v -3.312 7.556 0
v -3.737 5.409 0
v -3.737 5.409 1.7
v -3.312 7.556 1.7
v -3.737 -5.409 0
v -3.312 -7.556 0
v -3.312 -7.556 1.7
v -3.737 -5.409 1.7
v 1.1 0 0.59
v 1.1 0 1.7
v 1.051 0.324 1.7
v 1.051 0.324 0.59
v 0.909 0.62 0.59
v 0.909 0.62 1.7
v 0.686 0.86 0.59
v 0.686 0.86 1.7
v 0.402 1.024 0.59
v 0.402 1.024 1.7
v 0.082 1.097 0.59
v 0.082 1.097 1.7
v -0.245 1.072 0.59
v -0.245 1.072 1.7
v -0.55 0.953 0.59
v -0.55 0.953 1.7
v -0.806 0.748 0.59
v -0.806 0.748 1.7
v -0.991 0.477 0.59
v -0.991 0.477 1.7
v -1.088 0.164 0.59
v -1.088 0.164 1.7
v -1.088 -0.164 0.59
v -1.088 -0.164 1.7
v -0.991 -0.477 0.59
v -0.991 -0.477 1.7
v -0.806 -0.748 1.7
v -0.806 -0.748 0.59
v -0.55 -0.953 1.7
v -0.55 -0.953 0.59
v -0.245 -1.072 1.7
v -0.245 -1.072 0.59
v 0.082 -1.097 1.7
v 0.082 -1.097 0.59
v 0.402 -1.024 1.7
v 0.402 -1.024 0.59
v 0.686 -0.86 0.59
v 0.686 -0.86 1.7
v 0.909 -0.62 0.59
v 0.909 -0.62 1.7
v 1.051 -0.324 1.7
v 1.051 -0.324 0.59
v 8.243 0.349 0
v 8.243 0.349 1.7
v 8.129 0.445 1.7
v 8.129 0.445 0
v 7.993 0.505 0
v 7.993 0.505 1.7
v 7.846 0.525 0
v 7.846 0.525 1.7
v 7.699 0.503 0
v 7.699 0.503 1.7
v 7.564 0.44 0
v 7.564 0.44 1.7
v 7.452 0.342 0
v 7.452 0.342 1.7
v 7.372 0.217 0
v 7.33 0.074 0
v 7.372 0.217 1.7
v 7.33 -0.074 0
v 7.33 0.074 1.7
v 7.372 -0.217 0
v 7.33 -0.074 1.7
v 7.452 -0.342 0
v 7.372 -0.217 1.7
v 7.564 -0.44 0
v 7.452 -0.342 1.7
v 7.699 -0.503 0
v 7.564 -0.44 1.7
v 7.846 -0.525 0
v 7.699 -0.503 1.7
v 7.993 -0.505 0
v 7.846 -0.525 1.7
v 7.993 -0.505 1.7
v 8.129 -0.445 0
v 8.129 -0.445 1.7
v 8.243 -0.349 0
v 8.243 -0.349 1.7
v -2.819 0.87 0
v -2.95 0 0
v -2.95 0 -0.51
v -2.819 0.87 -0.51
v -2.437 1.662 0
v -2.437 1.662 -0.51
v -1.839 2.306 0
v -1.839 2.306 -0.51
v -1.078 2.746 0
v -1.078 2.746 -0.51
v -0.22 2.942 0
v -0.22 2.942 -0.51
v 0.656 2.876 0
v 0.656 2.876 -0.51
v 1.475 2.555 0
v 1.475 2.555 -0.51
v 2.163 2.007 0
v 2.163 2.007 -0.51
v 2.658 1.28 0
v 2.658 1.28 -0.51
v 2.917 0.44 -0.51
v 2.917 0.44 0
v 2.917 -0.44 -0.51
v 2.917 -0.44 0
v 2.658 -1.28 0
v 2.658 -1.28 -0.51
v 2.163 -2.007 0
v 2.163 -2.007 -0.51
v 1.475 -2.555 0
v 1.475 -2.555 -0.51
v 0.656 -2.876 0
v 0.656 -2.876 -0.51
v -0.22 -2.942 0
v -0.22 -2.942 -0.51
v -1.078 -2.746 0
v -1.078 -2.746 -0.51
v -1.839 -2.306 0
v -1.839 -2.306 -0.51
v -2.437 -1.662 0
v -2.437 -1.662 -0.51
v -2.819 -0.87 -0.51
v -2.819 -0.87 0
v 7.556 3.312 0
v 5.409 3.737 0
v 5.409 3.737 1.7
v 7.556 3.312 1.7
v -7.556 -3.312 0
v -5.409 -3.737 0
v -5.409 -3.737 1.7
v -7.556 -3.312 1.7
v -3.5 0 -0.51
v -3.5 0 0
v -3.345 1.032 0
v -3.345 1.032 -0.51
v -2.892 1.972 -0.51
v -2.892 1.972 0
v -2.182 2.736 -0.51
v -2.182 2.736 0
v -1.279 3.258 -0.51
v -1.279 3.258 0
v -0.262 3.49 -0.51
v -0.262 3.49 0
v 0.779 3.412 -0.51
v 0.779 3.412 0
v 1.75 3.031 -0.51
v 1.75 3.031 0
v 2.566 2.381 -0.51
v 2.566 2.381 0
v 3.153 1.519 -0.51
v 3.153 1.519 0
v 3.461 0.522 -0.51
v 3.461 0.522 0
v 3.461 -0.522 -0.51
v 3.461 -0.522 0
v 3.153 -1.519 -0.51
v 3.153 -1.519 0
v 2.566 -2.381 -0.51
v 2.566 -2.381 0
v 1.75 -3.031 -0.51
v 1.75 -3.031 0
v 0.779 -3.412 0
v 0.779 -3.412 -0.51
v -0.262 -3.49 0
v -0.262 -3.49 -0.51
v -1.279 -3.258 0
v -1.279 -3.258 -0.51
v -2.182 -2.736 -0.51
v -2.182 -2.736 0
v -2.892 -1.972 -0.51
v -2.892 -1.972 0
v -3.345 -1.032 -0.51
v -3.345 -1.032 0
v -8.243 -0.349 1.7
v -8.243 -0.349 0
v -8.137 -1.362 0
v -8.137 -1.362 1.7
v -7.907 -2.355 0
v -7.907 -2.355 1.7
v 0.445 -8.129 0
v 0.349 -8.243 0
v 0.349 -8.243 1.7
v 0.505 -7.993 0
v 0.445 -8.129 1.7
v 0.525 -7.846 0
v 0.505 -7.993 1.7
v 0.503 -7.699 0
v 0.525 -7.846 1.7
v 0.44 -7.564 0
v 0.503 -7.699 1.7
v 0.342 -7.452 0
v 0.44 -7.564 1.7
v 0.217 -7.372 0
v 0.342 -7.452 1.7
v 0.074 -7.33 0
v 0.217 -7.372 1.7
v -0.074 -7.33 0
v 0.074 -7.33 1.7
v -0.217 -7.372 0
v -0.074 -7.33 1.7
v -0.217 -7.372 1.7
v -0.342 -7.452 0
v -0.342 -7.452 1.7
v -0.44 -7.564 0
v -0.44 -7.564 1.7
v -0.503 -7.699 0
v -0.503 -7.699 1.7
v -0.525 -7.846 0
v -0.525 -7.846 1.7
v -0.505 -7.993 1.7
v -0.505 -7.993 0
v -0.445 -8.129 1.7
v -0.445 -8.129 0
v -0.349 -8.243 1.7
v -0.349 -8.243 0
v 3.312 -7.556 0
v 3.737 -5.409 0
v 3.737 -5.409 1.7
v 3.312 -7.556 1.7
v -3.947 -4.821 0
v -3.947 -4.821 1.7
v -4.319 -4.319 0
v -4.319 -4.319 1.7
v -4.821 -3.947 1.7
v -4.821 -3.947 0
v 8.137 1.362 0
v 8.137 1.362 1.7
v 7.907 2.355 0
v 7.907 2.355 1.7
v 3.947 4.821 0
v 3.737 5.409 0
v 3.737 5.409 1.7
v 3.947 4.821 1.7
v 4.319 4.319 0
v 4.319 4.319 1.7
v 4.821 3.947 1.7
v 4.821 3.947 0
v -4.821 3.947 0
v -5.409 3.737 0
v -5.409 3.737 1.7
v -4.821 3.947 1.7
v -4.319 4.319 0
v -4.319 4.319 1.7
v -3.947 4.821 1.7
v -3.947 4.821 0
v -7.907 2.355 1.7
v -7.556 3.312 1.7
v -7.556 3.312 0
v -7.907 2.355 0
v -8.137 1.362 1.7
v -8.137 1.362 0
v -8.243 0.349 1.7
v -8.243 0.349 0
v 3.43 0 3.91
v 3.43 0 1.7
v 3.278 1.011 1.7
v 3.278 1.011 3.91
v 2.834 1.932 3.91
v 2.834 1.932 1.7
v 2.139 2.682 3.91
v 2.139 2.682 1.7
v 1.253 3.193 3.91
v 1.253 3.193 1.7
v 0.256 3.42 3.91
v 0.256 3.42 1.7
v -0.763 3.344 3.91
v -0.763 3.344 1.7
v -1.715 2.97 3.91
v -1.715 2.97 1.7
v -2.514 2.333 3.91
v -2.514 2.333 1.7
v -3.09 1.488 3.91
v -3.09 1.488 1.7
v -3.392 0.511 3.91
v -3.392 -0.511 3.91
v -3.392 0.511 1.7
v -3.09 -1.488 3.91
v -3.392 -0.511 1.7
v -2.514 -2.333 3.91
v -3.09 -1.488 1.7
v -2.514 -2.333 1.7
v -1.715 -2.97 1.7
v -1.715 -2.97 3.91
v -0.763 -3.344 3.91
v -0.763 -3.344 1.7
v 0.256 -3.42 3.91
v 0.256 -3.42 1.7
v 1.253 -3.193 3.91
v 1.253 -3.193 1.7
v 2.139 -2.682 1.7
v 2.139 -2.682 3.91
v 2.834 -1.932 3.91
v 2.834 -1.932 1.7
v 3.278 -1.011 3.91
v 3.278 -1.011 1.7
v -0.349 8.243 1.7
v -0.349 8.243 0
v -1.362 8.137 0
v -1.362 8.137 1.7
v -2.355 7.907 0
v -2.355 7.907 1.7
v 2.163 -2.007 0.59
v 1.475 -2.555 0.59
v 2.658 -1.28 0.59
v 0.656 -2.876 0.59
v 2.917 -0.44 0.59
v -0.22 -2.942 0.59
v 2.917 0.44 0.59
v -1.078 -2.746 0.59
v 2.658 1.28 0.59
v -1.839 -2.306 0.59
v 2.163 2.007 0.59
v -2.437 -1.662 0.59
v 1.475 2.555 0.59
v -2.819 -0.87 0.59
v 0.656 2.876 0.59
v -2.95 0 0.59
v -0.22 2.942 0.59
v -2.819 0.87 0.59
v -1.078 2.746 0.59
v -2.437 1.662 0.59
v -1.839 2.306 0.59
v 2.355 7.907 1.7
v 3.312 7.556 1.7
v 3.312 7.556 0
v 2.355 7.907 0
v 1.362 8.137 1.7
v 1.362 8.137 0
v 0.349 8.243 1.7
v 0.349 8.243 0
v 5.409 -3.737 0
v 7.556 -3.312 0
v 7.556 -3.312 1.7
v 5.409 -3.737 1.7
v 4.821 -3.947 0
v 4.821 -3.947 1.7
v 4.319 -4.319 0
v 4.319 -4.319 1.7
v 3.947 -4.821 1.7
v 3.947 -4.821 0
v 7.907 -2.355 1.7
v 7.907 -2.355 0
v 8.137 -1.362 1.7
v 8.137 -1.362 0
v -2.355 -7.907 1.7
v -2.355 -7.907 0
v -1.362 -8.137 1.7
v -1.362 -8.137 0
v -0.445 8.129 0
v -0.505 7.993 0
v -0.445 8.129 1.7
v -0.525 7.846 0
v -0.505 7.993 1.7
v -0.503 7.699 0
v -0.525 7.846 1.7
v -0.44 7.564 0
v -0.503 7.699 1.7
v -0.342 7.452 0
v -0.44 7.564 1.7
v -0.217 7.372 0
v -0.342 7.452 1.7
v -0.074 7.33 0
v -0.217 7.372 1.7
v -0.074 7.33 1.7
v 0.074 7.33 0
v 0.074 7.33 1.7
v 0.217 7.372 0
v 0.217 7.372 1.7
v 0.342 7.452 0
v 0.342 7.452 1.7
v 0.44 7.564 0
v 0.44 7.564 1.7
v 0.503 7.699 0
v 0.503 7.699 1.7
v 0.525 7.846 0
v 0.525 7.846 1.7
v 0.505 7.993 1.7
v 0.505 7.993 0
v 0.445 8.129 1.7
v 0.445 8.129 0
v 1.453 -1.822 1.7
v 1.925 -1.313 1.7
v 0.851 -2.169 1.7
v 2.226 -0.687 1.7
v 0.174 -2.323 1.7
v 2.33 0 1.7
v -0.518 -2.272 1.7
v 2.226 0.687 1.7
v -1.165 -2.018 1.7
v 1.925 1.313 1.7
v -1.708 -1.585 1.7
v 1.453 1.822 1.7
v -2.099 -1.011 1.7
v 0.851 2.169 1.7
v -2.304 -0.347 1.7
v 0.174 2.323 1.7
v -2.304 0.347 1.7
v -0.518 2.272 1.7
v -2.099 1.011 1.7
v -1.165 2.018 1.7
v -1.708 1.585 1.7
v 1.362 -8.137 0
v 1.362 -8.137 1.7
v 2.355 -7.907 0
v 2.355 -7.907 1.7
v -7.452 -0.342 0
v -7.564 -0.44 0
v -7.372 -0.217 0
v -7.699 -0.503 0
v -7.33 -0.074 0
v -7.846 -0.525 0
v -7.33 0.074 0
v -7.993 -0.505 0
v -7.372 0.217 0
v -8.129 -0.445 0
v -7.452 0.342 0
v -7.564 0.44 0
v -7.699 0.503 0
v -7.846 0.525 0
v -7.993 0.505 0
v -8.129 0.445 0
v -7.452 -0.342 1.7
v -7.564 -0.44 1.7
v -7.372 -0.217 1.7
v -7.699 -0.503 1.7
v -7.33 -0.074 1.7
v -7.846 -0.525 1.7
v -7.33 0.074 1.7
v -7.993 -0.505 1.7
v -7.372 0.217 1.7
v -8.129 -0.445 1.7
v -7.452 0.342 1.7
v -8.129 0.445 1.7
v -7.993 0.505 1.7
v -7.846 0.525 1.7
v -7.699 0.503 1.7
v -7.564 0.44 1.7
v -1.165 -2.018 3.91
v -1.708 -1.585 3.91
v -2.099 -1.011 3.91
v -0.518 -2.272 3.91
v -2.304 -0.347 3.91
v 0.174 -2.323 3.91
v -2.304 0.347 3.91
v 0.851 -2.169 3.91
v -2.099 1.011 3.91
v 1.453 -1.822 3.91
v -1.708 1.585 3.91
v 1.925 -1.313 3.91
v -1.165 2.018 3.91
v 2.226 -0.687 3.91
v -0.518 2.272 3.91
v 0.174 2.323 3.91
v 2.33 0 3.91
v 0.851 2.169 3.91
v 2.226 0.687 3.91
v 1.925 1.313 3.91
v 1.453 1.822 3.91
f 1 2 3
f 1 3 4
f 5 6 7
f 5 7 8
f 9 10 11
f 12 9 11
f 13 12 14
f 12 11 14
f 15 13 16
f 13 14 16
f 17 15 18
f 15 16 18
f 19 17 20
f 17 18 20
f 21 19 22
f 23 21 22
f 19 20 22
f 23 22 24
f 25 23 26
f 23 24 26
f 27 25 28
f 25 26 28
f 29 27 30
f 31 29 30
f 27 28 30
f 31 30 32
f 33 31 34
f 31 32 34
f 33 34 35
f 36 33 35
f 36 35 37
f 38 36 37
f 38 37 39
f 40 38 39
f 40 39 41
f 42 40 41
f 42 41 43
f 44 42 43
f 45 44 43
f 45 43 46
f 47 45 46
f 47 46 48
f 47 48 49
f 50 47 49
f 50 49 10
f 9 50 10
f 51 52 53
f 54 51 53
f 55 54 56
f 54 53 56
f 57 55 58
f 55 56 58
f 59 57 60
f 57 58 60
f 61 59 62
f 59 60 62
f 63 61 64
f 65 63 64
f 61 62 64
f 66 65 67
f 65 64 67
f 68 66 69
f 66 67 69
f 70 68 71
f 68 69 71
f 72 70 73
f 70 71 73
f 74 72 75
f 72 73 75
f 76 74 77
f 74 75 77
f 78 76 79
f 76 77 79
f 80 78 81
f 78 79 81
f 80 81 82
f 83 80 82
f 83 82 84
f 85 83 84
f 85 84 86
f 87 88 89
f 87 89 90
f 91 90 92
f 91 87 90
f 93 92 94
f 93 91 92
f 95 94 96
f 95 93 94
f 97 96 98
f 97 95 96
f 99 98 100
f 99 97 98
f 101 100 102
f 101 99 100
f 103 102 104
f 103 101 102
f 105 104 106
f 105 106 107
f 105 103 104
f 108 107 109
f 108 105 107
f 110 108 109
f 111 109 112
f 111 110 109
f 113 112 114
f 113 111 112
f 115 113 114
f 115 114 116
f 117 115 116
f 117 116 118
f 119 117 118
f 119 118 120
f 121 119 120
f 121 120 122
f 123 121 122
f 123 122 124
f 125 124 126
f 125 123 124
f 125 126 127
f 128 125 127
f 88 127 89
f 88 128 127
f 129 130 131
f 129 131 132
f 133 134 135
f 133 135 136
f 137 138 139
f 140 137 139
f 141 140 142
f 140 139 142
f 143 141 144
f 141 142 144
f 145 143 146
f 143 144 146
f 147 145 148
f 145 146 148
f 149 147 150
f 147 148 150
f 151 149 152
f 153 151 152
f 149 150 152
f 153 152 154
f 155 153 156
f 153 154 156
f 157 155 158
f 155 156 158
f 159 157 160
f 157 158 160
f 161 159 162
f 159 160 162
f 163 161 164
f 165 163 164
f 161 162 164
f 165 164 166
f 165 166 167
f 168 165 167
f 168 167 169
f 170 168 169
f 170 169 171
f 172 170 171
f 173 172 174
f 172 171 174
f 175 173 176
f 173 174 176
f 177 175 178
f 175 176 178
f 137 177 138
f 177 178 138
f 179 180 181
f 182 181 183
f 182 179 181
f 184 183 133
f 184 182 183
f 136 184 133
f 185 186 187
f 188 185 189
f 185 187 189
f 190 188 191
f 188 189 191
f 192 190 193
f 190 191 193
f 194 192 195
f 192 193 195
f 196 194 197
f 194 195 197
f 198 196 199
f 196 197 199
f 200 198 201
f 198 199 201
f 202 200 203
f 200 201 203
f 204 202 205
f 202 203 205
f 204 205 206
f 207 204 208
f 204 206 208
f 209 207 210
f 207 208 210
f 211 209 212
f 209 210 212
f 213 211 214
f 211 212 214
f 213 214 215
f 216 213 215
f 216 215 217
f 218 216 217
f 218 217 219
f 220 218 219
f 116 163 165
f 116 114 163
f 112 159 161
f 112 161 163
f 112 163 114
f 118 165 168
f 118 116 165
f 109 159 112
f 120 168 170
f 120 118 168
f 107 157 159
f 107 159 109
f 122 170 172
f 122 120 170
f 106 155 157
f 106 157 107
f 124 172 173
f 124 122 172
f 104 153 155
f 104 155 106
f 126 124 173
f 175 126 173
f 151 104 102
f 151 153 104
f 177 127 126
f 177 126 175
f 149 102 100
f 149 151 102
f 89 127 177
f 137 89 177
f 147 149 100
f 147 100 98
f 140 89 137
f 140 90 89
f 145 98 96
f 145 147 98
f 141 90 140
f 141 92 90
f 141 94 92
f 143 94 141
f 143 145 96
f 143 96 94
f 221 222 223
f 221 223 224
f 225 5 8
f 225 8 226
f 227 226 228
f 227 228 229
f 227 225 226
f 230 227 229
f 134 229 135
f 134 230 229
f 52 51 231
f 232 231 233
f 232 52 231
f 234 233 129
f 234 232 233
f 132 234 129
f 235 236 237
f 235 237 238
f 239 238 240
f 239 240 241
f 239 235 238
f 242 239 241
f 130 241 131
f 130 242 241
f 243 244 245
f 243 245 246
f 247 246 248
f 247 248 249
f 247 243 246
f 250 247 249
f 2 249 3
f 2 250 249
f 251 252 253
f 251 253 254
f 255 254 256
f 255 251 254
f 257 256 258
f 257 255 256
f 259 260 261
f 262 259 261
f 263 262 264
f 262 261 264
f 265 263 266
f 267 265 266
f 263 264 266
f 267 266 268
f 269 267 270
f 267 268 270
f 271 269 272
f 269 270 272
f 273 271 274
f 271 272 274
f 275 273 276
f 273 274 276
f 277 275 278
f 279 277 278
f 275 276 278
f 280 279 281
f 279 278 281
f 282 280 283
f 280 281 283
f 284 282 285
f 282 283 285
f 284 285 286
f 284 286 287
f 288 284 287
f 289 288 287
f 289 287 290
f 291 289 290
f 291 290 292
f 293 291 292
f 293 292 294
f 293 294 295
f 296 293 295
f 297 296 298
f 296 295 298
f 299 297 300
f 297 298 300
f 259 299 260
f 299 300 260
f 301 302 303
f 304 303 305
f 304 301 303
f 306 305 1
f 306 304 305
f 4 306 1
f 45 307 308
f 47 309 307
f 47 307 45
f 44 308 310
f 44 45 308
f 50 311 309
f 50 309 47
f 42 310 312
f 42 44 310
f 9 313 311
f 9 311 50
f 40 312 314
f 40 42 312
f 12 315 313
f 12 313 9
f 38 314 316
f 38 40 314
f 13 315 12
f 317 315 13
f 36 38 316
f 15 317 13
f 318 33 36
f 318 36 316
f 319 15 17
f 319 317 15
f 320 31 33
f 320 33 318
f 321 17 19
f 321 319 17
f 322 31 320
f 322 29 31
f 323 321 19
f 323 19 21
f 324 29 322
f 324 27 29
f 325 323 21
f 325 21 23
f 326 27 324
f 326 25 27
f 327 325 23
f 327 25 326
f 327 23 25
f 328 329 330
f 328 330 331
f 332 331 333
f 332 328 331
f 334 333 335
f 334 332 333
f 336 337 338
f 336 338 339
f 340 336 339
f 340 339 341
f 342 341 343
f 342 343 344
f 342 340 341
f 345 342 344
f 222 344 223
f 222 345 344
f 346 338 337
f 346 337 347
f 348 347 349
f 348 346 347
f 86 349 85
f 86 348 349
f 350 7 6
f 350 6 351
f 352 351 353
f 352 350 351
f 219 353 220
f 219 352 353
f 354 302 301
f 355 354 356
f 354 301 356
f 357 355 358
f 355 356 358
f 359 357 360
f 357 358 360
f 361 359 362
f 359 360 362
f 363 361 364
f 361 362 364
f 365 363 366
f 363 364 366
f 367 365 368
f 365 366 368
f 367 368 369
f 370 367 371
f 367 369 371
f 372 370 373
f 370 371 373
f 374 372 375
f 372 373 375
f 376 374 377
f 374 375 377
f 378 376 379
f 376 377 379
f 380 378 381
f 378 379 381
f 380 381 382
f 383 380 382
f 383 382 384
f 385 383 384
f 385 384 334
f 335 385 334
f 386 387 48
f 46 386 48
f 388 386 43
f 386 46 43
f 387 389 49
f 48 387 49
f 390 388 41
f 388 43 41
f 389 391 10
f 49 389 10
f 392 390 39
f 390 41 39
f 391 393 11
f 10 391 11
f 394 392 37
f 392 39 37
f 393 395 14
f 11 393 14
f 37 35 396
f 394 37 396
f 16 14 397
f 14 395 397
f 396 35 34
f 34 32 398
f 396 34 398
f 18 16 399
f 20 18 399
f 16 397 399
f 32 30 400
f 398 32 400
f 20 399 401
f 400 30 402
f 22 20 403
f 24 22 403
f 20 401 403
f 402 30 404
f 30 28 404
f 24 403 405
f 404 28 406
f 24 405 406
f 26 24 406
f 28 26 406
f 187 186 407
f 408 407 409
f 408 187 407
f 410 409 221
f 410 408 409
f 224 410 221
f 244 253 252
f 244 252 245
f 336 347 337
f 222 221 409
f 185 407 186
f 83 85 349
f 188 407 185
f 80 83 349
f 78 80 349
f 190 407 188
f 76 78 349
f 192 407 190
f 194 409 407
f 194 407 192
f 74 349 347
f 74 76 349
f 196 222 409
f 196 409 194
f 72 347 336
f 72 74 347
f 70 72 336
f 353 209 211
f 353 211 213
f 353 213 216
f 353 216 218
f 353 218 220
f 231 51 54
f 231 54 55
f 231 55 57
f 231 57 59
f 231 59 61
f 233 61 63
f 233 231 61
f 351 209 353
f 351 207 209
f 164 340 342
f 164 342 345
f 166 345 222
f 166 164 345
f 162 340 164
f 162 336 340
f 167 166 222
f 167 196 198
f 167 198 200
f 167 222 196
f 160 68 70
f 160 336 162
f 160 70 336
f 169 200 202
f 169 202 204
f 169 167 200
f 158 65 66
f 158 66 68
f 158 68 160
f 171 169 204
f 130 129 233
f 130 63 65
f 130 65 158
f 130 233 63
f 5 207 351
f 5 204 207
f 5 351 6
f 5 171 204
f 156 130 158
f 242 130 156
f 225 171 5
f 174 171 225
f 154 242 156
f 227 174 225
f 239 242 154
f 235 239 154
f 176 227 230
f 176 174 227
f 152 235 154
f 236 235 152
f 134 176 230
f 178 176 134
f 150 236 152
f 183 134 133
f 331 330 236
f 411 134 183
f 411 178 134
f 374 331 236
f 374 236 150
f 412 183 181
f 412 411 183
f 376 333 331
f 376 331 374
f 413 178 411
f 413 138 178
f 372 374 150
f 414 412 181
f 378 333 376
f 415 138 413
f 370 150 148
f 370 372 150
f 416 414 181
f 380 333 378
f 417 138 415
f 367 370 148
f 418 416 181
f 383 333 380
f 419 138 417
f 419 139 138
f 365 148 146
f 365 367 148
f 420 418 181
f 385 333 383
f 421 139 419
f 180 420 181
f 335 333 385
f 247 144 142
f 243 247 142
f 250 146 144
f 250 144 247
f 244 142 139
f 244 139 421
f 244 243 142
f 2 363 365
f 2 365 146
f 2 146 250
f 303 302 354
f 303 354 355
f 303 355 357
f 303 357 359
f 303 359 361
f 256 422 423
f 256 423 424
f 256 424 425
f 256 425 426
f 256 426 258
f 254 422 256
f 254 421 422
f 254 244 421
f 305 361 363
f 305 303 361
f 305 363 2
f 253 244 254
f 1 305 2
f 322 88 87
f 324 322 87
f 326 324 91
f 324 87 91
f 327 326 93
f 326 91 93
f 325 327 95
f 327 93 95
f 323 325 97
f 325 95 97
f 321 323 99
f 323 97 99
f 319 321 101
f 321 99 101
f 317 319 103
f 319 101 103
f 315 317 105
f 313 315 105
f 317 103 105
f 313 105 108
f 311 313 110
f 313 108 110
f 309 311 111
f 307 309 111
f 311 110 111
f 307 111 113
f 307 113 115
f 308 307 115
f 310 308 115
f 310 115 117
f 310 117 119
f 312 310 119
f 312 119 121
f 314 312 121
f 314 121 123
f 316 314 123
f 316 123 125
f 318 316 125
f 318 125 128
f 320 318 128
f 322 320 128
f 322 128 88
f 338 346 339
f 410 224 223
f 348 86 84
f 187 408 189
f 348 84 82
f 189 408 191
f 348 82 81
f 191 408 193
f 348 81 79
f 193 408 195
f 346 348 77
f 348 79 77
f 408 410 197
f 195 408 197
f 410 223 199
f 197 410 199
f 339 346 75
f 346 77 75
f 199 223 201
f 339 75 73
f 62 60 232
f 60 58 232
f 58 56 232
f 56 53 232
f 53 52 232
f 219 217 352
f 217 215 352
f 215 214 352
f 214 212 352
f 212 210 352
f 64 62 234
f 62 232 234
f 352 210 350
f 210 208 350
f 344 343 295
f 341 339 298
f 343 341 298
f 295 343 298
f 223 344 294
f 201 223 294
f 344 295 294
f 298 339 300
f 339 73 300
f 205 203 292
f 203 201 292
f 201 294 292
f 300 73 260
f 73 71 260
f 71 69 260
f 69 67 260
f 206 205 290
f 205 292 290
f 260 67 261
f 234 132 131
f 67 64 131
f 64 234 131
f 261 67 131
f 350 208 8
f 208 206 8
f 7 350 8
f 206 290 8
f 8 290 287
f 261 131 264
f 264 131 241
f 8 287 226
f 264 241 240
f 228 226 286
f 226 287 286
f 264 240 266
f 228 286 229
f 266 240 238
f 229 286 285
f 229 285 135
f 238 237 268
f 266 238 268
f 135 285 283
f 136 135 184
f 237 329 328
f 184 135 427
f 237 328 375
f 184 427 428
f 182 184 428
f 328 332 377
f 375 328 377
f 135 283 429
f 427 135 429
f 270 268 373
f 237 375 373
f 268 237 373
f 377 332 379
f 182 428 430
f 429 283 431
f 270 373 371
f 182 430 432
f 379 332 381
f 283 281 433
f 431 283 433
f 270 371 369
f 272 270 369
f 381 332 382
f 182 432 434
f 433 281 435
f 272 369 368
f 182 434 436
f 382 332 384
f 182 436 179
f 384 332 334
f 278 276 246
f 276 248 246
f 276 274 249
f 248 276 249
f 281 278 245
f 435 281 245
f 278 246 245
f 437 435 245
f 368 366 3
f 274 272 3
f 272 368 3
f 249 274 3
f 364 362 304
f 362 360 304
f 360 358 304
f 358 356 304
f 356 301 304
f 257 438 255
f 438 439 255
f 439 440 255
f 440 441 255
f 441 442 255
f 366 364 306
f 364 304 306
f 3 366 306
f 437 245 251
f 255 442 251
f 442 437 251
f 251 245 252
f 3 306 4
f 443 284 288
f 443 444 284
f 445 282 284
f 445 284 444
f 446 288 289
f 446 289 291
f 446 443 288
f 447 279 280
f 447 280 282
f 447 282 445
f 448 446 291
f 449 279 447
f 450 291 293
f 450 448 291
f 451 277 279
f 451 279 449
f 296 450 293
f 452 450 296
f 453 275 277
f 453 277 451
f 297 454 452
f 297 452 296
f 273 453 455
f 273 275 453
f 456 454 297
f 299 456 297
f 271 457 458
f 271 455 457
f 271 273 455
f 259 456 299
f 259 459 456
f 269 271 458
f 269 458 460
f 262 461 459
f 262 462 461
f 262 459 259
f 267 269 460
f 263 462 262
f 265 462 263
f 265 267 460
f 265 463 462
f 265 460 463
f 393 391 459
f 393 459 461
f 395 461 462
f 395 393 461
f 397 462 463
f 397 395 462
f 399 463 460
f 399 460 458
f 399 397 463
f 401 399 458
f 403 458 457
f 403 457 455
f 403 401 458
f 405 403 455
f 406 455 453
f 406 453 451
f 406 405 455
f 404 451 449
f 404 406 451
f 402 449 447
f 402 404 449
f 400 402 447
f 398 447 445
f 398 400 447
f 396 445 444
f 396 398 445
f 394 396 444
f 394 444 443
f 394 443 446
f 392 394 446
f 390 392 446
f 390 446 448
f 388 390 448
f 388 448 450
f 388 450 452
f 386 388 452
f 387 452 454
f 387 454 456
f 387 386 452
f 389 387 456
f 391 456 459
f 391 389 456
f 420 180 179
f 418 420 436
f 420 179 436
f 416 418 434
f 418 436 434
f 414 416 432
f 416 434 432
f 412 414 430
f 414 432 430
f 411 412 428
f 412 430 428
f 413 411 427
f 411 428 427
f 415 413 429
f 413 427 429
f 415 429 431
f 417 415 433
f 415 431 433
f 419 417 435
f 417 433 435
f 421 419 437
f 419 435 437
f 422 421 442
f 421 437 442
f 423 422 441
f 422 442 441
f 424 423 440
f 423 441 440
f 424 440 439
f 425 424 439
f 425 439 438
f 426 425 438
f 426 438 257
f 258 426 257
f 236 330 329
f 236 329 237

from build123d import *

# Parameters (mm, degrees)
BOSS_EXTRUDE1_DEPTH     = 1.7
CUT_EXTRUDE1_REACH      = 3.7
SKETCH2_R               = 1.1
SKETCH3_R               = 3.43
SKETCH3_R_2             = 2.33
BOSS_EXTRUDE2_DEPTH     = 2.21
SKETCH4_R               = 3.5
SKETCH4_R_2             = 2.95
BOSS_EXTRUDE3_DEPTH     = 0.51
SKETCH5_R               = 2.95
CUT_EXTRUDE2_DEPTH      = 1.1
CUT_EXTRUDE3_REACH      = 4.21
SKETCH6_R               = 0.525
SKETCH7_R               = 18.883041925
SKETCH7_R_2             = 8.25
CUT_EXTRUDE4_DEPTH      = 3.21
CUT_EXTRUDE4_DEPTH_BACK = 3.21


with BuildPart() as part:
    # Sketch1 → Boss-Extrude1 (new body)
    with BuildSketch(Plane.XY):
        with BuildLine():
            Line((5.409077957, 3.736708277), (13.762285951, 2.084772448))
            ThreePointArc((13.762285951, 2.084772448), (15.475148434, 0), (13.762285951, -2.084772448))
            Line((13.762285951, -2.084772448), (5.409077957, -3.736708277))
            ThreePointArc((5.409077957, -3.736708277), (4.318733201, -4.318733201), (3.736708277, -5.409077957))
            Line((3.736708277, -5.409077957), (2.084772448, -13.762285951))
            ThreePointArc((2.084772448, -13.762285951), (0, -15.475148434), (-2.084772448, -13.762285951))
            Line((-2.084772448, -13.762285951), (-3.736708277, -5.409077957))
            ThreePointArc((-3.736708277, -5.409077957), (-4.318733201, -4.318733201), (-5.409077957, -3.736708277))
            Line((-5.409077957, -3.736708277), (-13.762285951, -2.084772448))
            ThreePointArc((-13.762285951, -2.084772448), (-15.475148434, 0), (-13.762285951, 2.084772448))
            Line((-13.762285951, 2.084772448), (-5.409077957, 3.736708277))
            ThreePointArc((-5.409077957, 3.736708277), (-4.318733201, 4.318733201), (-3.736708277, 5.409077957))
            Line((-3.736708277, 5.409077957), (-2.084772448, 13.762285951))
            ThreePointArc((-2.084772448, 13.762285951), (0, 15.475148434), (2.084772448, 13.762285951))
            Line((2.084772448, 13.762285951), (3.736708277, 5.409077957))
            ThreePointArc((3.736708277, 5.409077957), (4.318733201, 4.318733201), (5.409077957, 3.736708277))
        make_face()
    extrude(amount=BOSS_EXTRUDE1_DEPTH)

    # Sketch2 → Cut-Extrude1 (cut, up to next)
    with BuildSketch(Plane.XY.offset(1.7), mode=Mode.PRIVATE) as cut_extrude1_sk1:
        Circle(SKETCH2_R)
    cut_extrude1_tool1 = extrude(cut_extrude1_sk1.sketch, amount=-CUT_EXTRUDE1_REACH, mode=Mode.PRIVATE) & part.part
    add(cut_extrude1_tool1.solids().sort_by_distance((0, 0, 1.7))[0], mode=Mode.SUBTRACT)

    # Sketch3 → Boss-Extrude2 (add)
    with BuildSketch(Plane.XY.offset(1.7)):
        Circle(SKETCH3_R)
        Circle(SKETCH3_R_2, mode=Mode.SUBTRACT)
    extrude(amount=BOSS_EXTRUDE2_DEPTH)

    # Sketch4 → Boss-Extrude3 (add)
    with BuildSketch(Plane(origin=(0, 0, 0), x_dir=(-1, 0, 0), z_dir=(0, 0, -1))):
        Circle(SKETCH4_R)
        Circle(SKETCH4_R_2, mode=Mode.SUBTRACT)
    extrude(amount=BOSS_EXTRUDE3_DEPTH)

    # Sketch5 → Cut-Extrude2 (cut)
    with BuildSketch(Plane(origin=(0, 0, -0.51), x_dir=(-1, 0, 0), z_dir=(0, 0, -1))):
        Circle(SKETCH5_R)
    extrude(amount=-CUT_EXTRUDE2_DEPTH, mode=Mode.SUBTRACT)

    # Sketch6 → Cut-Extrude3 (cut, up to next)
    with BuildSketch(Plane.XY.offset(1.7), mode=Mode.PRIVATE) as cut_extrude3_sk1:
        with Locations((0, 13.35)):
            Circle(SKETCH6_R)
    cut_extrude3_tool1 = extrude(cut_extrude3_sk1.sketch, amount=-CUT_EXTRUDE3_REACH, mode=Mode.PRIVATE) & part.part
    add(cut_extrude3_tool1.solids().sort_by_distance((0, 13.35, 1.7))[0], mode=Mode.SUBTRACT)
    # Sketch6 → Cut-Extrude3 (cut, up to next)
    with BuildSketch(Plane.XY.offset(1.7), mode=Mode.PRIVATE) as cut_extrude3_sk2:
        with Locations((0, 10.6)):
            Circle(SKETCH6_R)
    cut_extrude3_tool2 = extrude(cut_extrude3_sk2.sketch, amount=-CUT_EXTRUDE3_REACH, mode=Mode.PRIVATE) & part.part
    add(cut_extrude3_tool2.solids().sort_by_distance((0, 10.6, 1.7))[0], mode=Mode.SUBTRACT)
    # Sketch6 → Cut-Extrude3 (cut, up to next)
    with BuildSketch(Plane.XY.offset(1.7), mode=Mode.PRIVATE) as cut_extrude3_sk3:
        with Locations((0, 7.85)):
            Circle(SKETCH6_R)
    cut_extrude3_tool3 = extrude(cut_extrude3_sk3.sketch, amount=-CUT_EXTRUDE3_REACH, mode=Mode.PRIVATE) & part.part
    add(cut_extrude3_tool3.solids().sort_by_distance((0, 7.85, 1.7))[0], mode=Mode.SUBTRACT)
    # Sketch6 → Cut-Extrude3 (cut, up to next)
    with BuildSketch(Plane.XY.offset(1.7), mode=Mode.PRIVATE) as cut_extrude3_sk4:
        with Locations((13.35, 0)):
            Circle(SKETCH6_R)
    cut_extrude3_tool4 = extrude(cut_extrude3_sk4.sketch, amount=-CUT_EXTRUDE3_REACH, mode=Mode.PRIVATE) & part.part
    add(cut_extrude3_tool4.solids().sort_by_distance((13.35, 0, 1.7))[0], mode=Mode.SUBTRACT)
    # Sketch6 → Cut-Extrude3 (cut, up to next)
    with BuildSketch(Plane.XY.offset(1.7), mode=Mode.PRIVATE) as cut_extrude3_sk5:
        with Locations((10.6, 0)):
            Circle(SKETCH6_R)
    cut_extrude3_tool5 = extrude(cut_extrude3_sk5.sketch, amount=-CUT_EXTRUDE3_REACH, mode=Mode.PRIVATE) & part.part
    add(cut_extrude3_tool5.solids().sort_by_distance((10.6, 0, 1.7))[0], mode=Mode.SUBTRACT)
    # Sketch6 → Cut-Extrude3 (cut, up to next)
    with BuildSketch(Plane.XY.offset(1.7), mode=Mode.PRIVATE) as cut_extrude3_sk6:
        with Locations((7.85, 0)):
            Circle(SKETCH6_R)
    cut_extrude3_tool6 = extrude(cut_extrude3_sk6.sketch, amount=-CUT_EXTRUDE3_REACH, mode=Mode.PRIVATE) & part.part
    add(cut_extrude3_tool6.solids().sort_by_distance((7.85, 0, 1.7))[0], mode=Mode.SUBTRACT)
    # Sketch6 → Cut-Extrude3 (cut, up to next)
    with BuildSketch(Plane.XY.offset(1.7), mode=Mode.PRIVATE) as cut_extrude3_sk7:
        with Locations((0, -13.35)):
            Circle(SKETCH6_R)
    cut_extrude3_tool7 = extrude(cut_extrude3_sk7.sketch, amount=-CUT_EXTRUDE3_REACH, mode=Mode.PRIVATE) & part.part
    add(cut_extrude3_tool7.solids().sort_by_distance((0, -13.35, 1.7))[0], mode=Mode.SUBTRACT)
    # Sketch6 → Cut-Extrude3 (cut, up to next)
    with BuildSketch(Plane.XY.offset(1.7), mode=Mode.PRIVATE) as cut_extrude3_sk8:
        with Locations((0, -10.6)):
            Circle(SKETCH6_R)
    cut_extrude3_tool8 = extrude(cut_extrude3_sk8.sketch, amount=-CUT_EXTRUDE3_REACH, mode=Mode.PRIVATE) & part.part
    add(cut_extrude3_tool8.solids().sort_by_distance((0, -10.6, 1.7))[0], mode=Mode.SUBTRACT)
    # Sketch6 → Cut-Extrude3 (cut, up to next)
    with BuildSketch(Plane.XY.offset(1.7), mode=Mode.PRIVATE) as cut_extrude3_sk9:
        with Locations((0, -7.85)):
            Circle(SKETCH6_R)
    cut_extrude3_tool9 = extrude(cut_extrude3_sk9.sketch, amount=-CUT_EXTRUDE3_REACH, mode=Mode.PRIVATE) & part.part
    add(cut_extrude3_tool9.solids().sort_by_distance((0, -7.85, 1.7))[0], mode=Mode.SUBTRACT)
    # Sketch6 → Cut-Extrude3 (cut, up to next)
    with BuildSketch(Plane.XY.offset(1.7), mode=Mode.PRIVATE) as cut_extrude3_sk10:
        with Locations((-13.35, 0)):
            Circle(SKETCH6_R)
    cut_extrude3_tool10 = extrude(cut_extrude3_sk10.sketch, amount=-CUT_EXTRUDE3_REACH, mode=Mode.PRIVATE) & part.part
    add(cut_extrude3_tool10.solids().sort_by_distance((-13.35, 0, 1.7))[0], mode=Mode.SUBTRACT)
    # Sketch6 → Cut-Extrude3 (cut, up to next)
    with BuildSketch(Plane.XY.offset(1.7), mode=Mode.PRIVATE) as cut_extrude3_sk11:
        with Locations((-10.6, 0)):
            Circle(SKETCH6_R)
    cut_extrude3_tool11 = extrude(cut_extrude3_sk11.sketch, amount=-CUT_EXTRUDE3_REACH, mode=Mode.PRIVATE) & part.part
    add(cut_extrude3_tool11.solids().sort_by_distance((-10.6, 0, 1.7))[0], mode=Mode.SUBTRACT)
    # Sketch6 → Cut-Extrude3 (cut, up to next)
    with BuildSketch(Plane.XY.offset(1.7), mode=Mode.PRIVATE) as cut_extrude3_sk12:
        with Locations((-7.85, 0)):
            Circle(SKETCH6_R)
    cut_extrude3_tool12 = extrude(cut_extrude3_sk12.sketch, amount=-CUT_EXTRUDE3_REACH, mode=Mode.PRIVATE) & part.part
    add(cut_extrude3_tool12.solids().sort_by_distance((-7.85, 0, 1.7))[0], mode=Mode.SUBTRACT)

    # Sketch7 → Cut-Extrude4 (cut, two sides)
    with BuildSketch(Plane.XY.offset(1.7)) as cut_extrude4_sk:
        Circle(SKETCH7_R)
        Circle(SKETCH7_R_2, mode=Mode.SUBTRACT)
    extrude(amount=CUT_EXTRUDE4_DEPTH, mode=Mode.SUBTRACT)
    extrude(cut_extrude4_sk.sketch, amount=-CUT_EXTRUDE4_DEPTH_BACK, mode=Mode.SUBTRACT)


solid = part.part
